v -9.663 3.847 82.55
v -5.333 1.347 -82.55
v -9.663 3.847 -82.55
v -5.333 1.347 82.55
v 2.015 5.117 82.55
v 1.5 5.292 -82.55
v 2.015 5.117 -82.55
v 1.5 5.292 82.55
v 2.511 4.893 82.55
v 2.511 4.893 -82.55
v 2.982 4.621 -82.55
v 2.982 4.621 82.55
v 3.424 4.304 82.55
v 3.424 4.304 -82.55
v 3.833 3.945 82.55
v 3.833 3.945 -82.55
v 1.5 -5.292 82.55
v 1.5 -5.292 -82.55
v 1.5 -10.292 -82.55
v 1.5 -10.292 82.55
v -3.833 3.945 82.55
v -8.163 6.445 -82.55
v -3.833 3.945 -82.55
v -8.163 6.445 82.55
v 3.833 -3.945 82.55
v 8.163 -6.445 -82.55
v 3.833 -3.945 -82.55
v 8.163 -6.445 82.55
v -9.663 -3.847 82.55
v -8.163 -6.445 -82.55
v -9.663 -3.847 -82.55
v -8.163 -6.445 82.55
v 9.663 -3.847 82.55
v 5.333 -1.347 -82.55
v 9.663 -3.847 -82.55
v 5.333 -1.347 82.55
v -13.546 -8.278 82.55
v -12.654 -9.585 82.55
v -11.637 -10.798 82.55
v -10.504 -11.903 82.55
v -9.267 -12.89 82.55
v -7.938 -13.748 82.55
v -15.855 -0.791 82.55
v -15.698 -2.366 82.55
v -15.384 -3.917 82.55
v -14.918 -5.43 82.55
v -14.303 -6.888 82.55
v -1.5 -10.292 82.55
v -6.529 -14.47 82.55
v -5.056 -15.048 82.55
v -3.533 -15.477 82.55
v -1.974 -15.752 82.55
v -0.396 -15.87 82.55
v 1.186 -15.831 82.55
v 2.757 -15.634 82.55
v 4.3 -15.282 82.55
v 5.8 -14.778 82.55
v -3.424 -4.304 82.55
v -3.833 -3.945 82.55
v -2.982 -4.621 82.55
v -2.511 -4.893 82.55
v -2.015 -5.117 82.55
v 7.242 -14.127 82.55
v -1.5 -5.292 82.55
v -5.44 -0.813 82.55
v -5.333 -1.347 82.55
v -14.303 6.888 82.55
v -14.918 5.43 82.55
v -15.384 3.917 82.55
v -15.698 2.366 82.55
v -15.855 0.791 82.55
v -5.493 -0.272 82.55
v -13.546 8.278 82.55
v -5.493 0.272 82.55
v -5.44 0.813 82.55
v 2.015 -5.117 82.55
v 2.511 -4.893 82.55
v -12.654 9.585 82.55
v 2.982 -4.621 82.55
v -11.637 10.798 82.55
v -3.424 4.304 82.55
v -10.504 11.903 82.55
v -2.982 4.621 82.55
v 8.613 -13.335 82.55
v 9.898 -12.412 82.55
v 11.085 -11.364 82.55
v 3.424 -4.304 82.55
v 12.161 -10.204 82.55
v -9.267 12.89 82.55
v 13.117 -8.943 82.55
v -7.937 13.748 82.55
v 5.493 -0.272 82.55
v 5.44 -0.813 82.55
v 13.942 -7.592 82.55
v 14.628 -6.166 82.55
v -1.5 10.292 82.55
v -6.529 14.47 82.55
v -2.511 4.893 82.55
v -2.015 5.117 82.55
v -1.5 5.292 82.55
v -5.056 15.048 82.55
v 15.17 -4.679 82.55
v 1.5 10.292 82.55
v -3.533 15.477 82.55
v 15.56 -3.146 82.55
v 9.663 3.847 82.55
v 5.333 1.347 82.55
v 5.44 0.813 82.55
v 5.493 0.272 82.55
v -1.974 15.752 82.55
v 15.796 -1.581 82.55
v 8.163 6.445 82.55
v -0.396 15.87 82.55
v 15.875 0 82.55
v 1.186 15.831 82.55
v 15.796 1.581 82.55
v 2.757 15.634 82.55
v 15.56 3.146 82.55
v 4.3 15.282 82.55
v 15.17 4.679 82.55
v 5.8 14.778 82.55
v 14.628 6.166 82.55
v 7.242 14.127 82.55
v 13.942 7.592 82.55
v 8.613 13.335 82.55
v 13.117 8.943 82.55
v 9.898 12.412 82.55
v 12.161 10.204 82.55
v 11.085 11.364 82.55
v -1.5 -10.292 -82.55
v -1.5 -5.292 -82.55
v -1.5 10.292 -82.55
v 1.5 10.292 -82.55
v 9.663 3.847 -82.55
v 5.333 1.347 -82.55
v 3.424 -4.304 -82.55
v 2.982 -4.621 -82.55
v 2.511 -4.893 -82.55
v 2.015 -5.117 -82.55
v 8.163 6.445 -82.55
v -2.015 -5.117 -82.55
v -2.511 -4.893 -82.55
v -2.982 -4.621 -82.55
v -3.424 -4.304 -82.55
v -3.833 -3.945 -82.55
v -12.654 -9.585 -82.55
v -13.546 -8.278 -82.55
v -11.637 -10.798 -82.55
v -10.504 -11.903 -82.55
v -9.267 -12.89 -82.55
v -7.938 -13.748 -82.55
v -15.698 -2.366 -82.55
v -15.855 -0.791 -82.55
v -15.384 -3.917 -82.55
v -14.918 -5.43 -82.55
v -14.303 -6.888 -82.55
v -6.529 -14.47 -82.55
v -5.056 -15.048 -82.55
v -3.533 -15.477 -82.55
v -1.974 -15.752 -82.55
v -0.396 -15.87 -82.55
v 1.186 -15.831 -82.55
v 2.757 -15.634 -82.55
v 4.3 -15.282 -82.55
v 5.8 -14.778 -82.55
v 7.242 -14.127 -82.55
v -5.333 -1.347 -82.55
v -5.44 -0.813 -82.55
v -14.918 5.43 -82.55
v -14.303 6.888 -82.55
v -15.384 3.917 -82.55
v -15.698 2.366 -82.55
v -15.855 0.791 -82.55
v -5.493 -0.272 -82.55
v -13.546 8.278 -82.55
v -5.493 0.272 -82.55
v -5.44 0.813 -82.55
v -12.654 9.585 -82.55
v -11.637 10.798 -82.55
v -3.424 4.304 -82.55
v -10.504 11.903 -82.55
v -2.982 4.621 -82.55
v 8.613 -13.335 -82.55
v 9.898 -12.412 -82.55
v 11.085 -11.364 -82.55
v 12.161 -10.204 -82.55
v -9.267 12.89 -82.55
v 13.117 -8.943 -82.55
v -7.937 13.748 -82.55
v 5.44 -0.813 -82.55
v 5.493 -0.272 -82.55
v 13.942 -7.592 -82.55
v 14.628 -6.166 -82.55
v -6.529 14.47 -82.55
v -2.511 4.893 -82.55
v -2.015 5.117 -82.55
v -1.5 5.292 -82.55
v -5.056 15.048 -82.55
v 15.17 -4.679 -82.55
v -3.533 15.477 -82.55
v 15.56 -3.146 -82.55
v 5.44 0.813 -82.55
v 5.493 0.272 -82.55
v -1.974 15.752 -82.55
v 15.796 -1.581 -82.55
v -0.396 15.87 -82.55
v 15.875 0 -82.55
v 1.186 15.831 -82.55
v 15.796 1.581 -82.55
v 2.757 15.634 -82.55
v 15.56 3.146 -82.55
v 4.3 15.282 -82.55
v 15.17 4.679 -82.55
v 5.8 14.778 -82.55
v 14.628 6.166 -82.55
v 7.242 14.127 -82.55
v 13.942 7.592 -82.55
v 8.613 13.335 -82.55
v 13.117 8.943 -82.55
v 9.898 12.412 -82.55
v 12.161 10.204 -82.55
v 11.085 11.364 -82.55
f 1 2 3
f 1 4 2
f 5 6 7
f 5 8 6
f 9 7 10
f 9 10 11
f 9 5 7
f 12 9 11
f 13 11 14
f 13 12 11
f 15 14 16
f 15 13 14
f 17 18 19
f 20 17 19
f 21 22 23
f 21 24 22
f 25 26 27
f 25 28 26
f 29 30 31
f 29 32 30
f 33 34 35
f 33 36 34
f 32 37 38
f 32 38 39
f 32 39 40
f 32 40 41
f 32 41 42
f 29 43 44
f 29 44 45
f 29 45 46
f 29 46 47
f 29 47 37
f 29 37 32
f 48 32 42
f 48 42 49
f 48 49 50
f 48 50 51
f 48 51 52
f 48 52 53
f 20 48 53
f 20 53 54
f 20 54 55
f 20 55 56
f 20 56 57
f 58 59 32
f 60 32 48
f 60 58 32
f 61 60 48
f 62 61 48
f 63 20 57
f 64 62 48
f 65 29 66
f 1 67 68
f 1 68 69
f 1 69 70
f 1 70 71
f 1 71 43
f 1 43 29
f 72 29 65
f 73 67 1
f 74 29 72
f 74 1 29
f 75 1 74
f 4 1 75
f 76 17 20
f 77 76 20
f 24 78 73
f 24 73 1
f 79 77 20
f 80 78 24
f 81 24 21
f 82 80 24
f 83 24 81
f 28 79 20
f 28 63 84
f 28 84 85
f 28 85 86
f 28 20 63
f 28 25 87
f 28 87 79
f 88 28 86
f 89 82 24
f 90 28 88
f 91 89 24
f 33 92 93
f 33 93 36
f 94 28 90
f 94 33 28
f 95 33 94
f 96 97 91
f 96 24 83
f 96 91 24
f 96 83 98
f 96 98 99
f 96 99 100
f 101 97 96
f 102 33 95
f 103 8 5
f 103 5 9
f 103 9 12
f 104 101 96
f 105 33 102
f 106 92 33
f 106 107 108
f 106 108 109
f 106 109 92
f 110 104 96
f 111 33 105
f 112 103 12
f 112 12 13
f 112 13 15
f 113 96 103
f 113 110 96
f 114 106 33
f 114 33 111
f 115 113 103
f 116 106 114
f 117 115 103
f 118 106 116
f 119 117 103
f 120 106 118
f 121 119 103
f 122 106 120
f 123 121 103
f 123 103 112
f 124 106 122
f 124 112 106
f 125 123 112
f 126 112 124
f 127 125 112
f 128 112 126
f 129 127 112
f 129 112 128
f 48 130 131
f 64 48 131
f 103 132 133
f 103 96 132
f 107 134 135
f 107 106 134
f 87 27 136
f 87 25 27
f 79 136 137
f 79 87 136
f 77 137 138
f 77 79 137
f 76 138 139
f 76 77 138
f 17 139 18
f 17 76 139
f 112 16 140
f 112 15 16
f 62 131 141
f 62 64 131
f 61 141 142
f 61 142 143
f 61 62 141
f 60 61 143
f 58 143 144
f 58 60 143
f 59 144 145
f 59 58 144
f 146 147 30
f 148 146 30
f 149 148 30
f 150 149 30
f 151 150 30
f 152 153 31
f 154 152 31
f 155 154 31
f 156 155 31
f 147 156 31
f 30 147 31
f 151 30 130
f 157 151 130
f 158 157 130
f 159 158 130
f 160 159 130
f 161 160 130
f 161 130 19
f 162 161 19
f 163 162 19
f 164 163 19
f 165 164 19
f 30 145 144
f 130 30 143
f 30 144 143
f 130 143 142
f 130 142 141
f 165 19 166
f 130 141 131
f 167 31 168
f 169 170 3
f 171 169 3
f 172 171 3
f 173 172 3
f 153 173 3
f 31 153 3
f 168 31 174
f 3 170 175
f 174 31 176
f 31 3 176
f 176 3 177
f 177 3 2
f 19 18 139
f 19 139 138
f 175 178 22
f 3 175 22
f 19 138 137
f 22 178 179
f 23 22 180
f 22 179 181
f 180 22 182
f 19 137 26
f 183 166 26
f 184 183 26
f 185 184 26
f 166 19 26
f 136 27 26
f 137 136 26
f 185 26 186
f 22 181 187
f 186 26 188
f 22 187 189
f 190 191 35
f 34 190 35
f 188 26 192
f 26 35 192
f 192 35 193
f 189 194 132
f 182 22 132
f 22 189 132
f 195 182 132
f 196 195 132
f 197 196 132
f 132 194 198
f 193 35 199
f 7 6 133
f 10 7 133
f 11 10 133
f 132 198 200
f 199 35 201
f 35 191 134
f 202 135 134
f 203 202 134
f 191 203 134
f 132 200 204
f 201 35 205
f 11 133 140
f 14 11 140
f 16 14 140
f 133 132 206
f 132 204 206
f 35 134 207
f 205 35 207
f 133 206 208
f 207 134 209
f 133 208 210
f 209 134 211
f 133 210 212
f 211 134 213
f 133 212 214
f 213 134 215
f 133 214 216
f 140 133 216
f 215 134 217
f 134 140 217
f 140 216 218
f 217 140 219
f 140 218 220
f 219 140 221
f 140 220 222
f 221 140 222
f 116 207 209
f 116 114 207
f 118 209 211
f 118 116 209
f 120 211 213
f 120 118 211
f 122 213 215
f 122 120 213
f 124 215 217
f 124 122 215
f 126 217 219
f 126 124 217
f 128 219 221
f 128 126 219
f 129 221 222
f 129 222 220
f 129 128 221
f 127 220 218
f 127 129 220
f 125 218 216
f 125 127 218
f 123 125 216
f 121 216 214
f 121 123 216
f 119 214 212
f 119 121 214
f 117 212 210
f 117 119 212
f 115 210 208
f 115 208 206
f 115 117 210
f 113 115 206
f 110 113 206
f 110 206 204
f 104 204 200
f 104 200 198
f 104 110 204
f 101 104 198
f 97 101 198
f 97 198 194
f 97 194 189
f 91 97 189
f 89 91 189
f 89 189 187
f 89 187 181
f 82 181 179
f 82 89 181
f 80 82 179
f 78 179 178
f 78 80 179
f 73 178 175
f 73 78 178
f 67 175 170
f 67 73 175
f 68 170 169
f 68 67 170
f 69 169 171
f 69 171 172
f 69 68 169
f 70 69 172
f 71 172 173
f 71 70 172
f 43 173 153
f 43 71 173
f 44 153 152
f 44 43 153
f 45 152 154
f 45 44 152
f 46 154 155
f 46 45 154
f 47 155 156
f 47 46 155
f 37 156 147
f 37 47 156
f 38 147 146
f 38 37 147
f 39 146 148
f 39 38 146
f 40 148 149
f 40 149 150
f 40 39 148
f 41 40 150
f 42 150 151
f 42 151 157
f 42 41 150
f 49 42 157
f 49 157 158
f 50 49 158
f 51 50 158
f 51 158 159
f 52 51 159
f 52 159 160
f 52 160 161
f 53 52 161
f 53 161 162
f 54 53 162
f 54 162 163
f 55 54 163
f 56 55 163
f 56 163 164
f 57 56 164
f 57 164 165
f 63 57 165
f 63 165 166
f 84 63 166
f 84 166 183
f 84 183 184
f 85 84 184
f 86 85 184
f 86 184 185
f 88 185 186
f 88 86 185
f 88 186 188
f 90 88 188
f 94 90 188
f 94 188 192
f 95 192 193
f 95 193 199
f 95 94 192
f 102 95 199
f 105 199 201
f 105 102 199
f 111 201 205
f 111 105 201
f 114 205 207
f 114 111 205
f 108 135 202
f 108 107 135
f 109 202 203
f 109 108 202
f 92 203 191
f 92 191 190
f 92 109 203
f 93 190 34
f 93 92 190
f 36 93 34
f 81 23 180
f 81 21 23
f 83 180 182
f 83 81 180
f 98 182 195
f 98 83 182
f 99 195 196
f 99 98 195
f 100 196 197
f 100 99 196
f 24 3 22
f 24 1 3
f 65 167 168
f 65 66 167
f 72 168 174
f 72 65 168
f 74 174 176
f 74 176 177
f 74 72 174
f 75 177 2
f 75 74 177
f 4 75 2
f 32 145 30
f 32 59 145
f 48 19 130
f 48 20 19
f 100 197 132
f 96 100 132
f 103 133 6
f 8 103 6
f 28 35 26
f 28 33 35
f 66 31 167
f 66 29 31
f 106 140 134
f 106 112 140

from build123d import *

# Parameters (mm, degrees)
SKETCH1_R           = 15.875
BOSS_EXTRUDE1_DEPTH = 82.55


with BuildPart() as part:
    # Sketch1 → Boss-Extrude1 (new, symmetric)
    with BuildSketch(Plane.XY):
        Circle(SKETCH1_R)
        with BuildLine():
            Line((-1.5, 5.291502622), (-1.5, 10.291502622))
            Line((-1.5, 10.291502622), (1.5, 10.291502622))
            Line((1.5, 10.291502622), (1.5, 5.291502622))
            ThreePointArc((1.5, 5.291502622), (2.75, 4.763139721), (3.832575695, 3.944789417))
            Line((3.832575695, 3.944789417), (8.162702714, 6.444789417))
            Line((8.162702714, 6.444789417), (9.662702714, 3.846713205))
            Line((9.662702714, 3.846713205), (5.332575695, 1.346713205))
            ThreePointArc((5.332575695, 1.346713205), (5.5, 0), (5.332575695, -1.346713205))
            Line((5.332575695, -1.346713205), (9.662702714, -3.846713205))
            Line((9.662702714, -3.846713205), (8.162702714, -6.444789417))
            Line((8.162702714, -6.444789417), (3.832575695, -3.944789417))
            ThreePointArc((3.832575695, -3.944789417), (2.75, -4.763139721), (1.5, -5.291502622))
            Line((1.5, -5.291502622), (1.5, -10.291502622))
            Line((1.5, -10.291502622), (-1.5, -10.291502622))
            Line((-1.5, -10.291502622), (-1.5, -5.291502622))
            ThreePointArc((-1.5, -5.291502622), (-2.75, -4.763139721), (-3.832575695, -3.944789417))
            Line((-3.832575695, -3.944789417), (-8.162702714, -6.444789417))
            Line((-8.162702714, -6.444789417), (-9.662702714, -3.846713205))
            Line((-9.662702714, -3.846713205), (-5.332575695, -1.346713205))
            ThreePointArc((-5.332575695, -1.346713205), (-5.5, 0), (-5.332575695, 1.346713205))
            Line((-5.332575695, 1.346713205), (-9.662702714, 3.846713205))
            Line((-9.662702714, 3.846713205), (-8.162702714, 6.444789417))
            Line((-8.162702714, 6.444789417), (-3.832575695, 3.944789417))
            ThreePointArc((-3.832575695, 3.944789417), (-2.75, 4.763139721), (-1.5, 5.291502622))
        make_face(mode=Mode.SUBTRACT)
    extrude(amount=BOSS_EXTRUDE1_DEPTH, both=True)


solid = part.part
